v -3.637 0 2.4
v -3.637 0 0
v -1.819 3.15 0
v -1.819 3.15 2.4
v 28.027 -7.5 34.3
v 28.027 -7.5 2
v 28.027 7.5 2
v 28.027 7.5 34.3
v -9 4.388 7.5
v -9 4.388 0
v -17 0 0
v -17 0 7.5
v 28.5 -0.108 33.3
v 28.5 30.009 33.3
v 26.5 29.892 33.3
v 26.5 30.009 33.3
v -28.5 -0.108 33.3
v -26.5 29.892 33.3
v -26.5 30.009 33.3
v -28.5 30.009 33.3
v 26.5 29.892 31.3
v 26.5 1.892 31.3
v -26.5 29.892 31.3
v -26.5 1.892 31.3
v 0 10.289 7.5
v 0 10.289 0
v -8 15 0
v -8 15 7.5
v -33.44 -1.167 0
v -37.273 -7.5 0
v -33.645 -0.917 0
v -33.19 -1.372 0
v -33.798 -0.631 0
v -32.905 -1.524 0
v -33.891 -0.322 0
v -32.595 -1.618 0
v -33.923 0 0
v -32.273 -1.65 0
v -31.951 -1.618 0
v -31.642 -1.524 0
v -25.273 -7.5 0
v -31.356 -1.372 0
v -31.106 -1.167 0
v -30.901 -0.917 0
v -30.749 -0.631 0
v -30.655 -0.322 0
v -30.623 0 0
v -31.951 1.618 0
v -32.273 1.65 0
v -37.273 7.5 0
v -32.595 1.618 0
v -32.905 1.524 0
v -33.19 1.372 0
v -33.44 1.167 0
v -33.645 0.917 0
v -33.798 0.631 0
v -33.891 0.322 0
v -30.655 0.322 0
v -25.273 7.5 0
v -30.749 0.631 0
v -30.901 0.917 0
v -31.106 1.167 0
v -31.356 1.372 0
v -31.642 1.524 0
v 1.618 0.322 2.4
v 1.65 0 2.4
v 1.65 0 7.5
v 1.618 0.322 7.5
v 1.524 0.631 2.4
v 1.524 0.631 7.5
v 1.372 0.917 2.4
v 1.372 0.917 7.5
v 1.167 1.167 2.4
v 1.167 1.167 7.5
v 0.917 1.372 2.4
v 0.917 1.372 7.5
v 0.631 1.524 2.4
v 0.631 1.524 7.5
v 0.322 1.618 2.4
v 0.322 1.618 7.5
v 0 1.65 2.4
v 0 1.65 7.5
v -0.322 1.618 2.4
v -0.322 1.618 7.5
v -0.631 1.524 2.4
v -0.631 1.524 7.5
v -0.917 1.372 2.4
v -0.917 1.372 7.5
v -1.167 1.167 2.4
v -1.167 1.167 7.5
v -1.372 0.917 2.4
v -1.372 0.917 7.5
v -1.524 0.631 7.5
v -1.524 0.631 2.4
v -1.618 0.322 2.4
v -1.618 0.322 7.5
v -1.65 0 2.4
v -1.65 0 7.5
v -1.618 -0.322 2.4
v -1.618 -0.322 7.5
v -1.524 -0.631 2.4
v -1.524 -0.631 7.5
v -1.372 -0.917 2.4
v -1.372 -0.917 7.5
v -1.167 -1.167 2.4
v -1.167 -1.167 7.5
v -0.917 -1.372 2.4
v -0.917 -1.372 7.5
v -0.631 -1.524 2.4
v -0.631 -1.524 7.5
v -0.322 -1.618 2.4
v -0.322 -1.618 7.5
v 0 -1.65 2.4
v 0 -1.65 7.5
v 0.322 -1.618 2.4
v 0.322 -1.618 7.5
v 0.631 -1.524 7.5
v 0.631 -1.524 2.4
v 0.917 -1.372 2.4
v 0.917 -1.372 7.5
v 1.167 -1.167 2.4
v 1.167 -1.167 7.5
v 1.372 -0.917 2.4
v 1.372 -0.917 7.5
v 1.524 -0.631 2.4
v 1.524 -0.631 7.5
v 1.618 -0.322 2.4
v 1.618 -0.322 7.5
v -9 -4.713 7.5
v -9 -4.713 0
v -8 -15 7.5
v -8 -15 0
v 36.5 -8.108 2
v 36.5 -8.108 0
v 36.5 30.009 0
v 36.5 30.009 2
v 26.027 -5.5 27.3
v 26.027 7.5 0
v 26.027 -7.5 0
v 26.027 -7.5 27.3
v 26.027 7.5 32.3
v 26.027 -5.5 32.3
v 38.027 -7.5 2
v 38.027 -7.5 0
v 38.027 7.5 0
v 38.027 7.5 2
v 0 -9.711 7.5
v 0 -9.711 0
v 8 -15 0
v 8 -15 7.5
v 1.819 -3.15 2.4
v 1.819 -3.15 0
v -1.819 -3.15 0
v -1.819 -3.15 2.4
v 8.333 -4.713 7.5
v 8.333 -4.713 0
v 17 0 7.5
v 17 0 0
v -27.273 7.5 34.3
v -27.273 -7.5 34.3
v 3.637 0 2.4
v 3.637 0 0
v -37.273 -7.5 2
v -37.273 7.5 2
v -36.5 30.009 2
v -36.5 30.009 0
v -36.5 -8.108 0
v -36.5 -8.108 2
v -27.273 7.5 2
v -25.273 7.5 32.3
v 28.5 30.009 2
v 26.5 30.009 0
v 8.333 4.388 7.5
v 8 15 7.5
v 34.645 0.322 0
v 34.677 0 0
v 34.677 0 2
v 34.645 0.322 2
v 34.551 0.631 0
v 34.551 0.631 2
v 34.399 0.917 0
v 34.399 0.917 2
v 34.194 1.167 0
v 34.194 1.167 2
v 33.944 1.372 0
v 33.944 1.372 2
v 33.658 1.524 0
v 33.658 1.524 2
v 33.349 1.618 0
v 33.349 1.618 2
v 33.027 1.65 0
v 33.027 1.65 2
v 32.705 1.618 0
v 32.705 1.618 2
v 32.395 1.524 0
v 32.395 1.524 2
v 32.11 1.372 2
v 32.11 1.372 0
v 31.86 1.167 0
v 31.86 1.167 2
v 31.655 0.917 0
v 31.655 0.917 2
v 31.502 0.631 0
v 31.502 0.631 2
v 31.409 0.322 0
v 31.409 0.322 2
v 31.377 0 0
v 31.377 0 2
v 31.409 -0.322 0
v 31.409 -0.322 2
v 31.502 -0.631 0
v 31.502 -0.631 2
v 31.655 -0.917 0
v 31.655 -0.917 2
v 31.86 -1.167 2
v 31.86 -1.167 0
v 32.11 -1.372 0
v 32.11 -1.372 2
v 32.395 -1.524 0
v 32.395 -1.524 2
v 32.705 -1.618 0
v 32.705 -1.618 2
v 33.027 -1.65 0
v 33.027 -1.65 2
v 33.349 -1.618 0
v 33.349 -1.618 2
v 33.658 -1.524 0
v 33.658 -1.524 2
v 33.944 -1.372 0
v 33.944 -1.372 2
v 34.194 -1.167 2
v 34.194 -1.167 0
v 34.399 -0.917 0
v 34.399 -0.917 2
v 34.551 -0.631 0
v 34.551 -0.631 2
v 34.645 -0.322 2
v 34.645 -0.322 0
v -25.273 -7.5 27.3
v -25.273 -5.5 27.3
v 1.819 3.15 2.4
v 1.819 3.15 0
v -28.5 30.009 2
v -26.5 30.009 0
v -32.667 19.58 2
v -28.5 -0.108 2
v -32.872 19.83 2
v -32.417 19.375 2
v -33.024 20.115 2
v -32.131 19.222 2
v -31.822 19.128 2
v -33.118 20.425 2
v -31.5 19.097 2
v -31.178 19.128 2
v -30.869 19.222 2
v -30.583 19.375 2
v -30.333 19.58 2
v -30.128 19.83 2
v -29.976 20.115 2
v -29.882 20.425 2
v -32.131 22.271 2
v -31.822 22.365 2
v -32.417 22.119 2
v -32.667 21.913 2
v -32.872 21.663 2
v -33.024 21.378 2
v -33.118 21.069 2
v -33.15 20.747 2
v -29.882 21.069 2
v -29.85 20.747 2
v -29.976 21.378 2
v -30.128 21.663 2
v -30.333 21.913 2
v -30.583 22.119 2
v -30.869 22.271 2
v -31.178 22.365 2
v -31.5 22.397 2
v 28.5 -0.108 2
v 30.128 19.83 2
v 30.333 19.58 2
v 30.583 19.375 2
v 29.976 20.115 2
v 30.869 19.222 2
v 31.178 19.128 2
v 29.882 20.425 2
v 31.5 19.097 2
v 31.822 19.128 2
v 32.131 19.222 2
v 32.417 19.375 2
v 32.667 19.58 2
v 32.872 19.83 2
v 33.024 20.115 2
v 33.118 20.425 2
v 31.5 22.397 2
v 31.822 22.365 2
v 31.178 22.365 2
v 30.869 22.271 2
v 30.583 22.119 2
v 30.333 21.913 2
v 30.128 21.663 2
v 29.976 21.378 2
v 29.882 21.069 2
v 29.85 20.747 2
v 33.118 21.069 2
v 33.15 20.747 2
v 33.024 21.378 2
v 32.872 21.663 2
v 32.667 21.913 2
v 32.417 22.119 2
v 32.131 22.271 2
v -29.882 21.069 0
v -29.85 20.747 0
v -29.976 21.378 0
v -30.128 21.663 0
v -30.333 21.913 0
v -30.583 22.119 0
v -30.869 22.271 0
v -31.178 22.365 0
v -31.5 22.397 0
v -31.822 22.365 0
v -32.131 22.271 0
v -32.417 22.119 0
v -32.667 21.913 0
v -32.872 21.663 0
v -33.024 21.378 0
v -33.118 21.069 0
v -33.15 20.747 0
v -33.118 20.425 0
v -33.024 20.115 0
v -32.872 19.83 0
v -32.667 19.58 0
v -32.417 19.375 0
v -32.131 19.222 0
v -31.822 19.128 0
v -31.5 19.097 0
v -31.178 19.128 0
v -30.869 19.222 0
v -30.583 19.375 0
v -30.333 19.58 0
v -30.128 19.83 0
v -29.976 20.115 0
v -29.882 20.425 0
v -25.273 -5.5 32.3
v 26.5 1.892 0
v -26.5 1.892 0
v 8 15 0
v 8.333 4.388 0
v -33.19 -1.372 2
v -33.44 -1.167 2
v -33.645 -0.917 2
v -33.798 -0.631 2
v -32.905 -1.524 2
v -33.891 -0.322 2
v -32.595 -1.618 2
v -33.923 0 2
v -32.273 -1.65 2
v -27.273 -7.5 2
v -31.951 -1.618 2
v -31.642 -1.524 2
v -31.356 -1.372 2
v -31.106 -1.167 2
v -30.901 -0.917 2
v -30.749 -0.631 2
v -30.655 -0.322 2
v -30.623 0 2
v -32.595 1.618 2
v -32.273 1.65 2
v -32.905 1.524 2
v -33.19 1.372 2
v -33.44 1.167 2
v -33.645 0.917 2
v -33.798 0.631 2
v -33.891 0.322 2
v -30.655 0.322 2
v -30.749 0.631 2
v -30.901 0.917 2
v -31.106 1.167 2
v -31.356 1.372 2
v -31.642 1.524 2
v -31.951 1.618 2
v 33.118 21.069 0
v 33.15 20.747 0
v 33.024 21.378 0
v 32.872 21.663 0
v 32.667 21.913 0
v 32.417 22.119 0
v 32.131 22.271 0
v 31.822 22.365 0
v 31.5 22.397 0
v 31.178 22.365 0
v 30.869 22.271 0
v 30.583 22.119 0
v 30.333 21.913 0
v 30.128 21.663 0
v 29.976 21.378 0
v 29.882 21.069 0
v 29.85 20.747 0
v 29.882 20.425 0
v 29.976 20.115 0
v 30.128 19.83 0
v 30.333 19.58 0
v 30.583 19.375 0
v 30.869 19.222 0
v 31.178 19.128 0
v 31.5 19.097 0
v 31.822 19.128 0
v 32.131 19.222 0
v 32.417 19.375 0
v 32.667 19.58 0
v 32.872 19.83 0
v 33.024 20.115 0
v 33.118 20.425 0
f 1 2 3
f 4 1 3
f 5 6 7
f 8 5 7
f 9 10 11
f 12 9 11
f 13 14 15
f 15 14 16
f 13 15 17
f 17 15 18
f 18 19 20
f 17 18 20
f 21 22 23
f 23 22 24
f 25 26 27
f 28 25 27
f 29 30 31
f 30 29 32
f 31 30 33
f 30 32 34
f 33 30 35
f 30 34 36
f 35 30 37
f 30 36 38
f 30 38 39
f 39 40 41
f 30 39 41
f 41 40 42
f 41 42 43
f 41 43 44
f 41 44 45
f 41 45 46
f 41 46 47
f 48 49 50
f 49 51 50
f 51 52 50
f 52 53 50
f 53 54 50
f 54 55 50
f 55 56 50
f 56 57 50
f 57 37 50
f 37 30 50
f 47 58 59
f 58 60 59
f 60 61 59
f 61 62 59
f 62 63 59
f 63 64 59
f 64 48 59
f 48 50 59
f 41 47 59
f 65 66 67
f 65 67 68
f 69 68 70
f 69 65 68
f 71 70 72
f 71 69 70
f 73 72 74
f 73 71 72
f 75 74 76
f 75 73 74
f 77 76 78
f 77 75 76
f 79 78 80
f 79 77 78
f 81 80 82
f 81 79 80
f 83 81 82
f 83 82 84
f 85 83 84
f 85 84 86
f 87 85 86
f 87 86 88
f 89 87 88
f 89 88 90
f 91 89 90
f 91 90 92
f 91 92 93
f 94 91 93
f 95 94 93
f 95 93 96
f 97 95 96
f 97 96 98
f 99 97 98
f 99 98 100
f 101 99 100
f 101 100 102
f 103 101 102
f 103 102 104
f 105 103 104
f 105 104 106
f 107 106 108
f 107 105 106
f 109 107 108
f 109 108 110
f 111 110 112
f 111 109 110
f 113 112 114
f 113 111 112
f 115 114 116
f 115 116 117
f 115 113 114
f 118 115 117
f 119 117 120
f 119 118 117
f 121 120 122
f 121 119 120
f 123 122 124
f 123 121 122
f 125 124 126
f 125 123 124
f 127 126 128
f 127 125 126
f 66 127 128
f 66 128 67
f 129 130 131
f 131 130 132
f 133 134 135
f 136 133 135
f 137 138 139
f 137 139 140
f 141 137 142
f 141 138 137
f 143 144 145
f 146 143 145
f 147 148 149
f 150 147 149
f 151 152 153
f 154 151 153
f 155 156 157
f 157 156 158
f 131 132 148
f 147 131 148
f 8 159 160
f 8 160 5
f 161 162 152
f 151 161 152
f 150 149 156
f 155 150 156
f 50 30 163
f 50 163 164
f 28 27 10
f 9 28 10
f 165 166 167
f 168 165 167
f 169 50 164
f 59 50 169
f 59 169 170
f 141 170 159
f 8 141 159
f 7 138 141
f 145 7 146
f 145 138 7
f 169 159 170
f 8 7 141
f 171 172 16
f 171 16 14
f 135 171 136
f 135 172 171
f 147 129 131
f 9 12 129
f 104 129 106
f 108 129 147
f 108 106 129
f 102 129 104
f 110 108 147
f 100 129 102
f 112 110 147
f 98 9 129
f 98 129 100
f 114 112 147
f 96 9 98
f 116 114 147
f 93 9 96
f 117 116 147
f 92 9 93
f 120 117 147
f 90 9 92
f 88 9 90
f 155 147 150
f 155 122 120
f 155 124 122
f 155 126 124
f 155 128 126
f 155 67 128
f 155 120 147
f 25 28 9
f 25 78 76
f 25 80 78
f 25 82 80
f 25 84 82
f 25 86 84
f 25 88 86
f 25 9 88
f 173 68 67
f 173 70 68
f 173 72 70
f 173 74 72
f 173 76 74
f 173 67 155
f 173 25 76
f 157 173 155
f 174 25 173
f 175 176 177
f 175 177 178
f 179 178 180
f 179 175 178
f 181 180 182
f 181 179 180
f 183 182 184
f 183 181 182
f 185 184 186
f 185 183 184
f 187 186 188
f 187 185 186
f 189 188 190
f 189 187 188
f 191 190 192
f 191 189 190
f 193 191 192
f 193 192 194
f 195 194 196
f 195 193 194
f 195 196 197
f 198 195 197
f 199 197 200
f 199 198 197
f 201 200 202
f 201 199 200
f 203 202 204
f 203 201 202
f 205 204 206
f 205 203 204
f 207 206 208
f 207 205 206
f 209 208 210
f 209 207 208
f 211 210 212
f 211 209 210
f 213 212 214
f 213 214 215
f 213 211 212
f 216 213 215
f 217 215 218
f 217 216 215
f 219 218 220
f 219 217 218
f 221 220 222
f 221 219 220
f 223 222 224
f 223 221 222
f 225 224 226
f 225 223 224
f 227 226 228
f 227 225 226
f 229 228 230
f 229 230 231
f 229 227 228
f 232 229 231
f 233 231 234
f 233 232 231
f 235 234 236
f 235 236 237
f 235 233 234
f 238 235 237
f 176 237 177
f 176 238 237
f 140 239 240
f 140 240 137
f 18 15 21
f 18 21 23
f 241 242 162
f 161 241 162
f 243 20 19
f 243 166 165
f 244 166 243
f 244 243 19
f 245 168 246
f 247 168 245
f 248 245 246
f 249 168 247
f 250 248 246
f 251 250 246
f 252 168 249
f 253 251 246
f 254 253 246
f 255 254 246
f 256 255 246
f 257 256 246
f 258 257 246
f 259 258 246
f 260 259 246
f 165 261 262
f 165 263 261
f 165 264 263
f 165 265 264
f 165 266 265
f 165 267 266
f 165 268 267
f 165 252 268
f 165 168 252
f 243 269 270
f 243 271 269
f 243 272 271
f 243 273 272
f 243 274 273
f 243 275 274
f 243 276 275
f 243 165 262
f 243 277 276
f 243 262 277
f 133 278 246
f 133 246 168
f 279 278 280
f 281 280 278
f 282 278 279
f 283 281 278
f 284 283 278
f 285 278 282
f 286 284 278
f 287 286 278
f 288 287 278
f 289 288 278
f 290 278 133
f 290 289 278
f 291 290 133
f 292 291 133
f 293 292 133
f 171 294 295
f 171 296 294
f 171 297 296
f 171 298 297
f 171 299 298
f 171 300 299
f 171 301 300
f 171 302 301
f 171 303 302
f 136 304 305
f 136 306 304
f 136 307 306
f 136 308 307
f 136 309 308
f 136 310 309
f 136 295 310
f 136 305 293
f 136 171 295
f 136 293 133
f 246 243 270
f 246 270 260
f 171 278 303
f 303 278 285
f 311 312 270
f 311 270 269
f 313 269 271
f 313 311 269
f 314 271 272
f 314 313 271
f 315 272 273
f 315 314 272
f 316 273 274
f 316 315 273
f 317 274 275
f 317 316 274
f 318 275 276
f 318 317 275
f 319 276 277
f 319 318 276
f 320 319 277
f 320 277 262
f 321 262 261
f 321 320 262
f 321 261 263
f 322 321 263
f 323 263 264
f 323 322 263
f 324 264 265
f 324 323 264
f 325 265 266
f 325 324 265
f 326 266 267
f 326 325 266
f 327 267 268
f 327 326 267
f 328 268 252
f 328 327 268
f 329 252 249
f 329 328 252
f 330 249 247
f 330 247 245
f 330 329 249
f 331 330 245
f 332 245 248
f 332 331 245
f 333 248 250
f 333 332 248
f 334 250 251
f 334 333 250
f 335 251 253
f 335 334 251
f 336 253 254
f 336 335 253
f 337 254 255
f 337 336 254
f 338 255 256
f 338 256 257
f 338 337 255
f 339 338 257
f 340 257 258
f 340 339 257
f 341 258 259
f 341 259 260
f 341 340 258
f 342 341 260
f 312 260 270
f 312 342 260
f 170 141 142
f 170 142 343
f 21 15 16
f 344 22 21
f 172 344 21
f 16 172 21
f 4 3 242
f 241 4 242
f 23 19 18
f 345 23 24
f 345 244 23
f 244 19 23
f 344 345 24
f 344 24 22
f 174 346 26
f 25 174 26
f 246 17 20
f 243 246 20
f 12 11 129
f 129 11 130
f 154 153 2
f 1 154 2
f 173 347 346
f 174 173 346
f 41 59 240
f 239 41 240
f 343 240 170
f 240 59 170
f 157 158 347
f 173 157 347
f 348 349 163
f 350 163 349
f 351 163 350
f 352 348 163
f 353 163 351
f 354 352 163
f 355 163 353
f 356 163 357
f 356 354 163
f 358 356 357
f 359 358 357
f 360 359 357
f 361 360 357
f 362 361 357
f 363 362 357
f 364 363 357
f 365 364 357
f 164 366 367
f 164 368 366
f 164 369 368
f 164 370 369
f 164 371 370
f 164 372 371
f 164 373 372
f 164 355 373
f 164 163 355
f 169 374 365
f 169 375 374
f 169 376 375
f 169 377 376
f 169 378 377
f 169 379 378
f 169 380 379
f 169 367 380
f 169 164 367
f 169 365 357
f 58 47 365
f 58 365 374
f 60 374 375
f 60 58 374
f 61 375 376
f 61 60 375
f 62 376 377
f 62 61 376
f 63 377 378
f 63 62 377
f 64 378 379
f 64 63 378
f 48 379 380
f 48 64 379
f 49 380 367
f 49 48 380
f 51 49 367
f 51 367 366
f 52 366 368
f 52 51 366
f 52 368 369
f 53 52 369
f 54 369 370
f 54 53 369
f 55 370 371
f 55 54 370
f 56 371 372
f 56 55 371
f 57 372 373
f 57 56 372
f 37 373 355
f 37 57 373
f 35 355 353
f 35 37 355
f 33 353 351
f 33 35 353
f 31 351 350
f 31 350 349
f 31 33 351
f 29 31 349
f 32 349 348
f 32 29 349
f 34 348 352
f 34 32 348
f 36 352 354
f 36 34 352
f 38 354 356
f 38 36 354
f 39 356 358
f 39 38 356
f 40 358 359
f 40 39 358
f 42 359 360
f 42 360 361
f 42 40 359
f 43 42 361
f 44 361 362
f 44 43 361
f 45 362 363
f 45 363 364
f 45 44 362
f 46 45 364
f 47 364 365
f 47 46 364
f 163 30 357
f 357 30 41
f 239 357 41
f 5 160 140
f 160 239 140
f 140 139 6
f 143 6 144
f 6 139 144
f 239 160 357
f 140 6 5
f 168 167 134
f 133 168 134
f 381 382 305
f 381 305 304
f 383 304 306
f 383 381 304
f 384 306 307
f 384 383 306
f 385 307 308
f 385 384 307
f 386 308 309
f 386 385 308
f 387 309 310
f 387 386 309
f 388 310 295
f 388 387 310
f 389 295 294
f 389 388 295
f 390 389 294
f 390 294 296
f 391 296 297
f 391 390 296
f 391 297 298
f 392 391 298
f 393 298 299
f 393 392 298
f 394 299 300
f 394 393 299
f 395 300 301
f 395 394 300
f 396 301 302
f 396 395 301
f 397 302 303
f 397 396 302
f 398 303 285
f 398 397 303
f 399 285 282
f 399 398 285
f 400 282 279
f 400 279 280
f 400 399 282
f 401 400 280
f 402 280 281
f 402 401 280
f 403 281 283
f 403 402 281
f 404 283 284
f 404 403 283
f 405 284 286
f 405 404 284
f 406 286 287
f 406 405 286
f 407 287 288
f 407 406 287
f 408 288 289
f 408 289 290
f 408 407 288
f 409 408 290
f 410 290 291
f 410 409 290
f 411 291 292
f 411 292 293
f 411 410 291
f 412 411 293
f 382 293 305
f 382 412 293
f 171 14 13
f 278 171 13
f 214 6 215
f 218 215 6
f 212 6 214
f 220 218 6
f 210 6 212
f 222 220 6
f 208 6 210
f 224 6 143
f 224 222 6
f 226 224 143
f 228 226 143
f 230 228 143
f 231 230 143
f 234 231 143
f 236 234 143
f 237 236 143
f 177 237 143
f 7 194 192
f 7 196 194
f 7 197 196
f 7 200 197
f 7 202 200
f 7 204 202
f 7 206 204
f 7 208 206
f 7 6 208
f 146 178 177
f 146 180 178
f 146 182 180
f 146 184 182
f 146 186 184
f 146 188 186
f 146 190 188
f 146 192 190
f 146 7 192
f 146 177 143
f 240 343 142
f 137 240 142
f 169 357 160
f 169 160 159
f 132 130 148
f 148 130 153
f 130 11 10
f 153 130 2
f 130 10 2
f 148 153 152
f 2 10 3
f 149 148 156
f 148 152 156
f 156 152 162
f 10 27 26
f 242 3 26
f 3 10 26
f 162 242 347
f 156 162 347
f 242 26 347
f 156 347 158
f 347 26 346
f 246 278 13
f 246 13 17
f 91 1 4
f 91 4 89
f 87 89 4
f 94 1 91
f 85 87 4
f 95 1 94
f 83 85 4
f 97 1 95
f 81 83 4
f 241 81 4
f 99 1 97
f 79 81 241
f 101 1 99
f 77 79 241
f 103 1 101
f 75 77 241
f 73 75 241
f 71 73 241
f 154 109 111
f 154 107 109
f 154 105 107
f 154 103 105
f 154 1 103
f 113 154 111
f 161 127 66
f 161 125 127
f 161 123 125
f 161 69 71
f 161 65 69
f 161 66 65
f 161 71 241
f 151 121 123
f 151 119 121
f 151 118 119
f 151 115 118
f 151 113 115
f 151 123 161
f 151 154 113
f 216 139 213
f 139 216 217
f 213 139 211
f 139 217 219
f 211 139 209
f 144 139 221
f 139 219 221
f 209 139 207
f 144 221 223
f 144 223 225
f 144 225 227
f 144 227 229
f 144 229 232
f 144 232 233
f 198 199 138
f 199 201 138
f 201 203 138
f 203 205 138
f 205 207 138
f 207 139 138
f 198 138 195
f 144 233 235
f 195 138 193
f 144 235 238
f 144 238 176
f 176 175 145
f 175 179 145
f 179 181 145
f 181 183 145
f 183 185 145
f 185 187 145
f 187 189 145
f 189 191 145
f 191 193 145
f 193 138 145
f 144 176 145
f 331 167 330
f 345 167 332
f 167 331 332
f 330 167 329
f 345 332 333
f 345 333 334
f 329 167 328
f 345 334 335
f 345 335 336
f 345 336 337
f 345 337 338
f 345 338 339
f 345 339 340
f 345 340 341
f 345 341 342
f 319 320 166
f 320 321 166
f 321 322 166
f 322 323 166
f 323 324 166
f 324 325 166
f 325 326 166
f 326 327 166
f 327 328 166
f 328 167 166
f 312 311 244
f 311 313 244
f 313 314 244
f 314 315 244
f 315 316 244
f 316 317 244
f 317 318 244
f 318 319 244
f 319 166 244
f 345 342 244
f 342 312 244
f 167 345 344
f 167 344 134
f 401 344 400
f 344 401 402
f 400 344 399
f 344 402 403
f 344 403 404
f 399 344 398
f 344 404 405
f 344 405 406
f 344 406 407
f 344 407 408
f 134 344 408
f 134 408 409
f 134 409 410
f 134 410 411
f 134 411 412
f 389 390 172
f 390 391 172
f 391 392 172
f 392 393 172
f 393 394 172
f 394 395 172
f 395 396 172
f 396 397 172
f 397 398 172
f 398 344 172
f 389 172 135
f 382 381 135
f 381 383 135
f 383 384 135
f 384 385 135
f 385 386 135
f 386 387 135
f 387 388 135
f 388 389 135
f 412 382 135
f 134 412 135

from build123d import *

# Parameters (mm, degrees)
SKETCH_R        = 1.65
PAD_DEPTH       = 7.5
POCKET_DEPTH    = 2.4
SKETCH002_R     = 1.65
PAD001_DEPTH    = 2
PAD002_DEPTH    = 31.3
SKETCH005_W     = 53
SKETCH005_H     = 2
PAD003_DEPTH    = 28
SKETCH006_W     = 75.3
SKETCH006_H     = 15
SKETCH006_R     = 1.65
PAD004_DEPTH    = 2
SKETCH007_W     = 55.3
SKETCH007_H     = 15
PAD005_DEPTH    = 32.3
SKETCH008_W     = 51.3
SKETCH008_H     = 32.3
POCKET001_DEPTH = 15.001
SKETCH009_W     = 51.3
SKETCH009_H     = 2
PAD006_DEPTH    = 5


with BuildPart() as pezinhos:
    # Sketch → Pad (new body)
    with BuildSketch(Plane.XY):
        Polygon((8, -15), (8.333333, -4.712968), (17, 0), (8.333333, 4.387791), (8, 15), (0, 10.289429), (-8, 15), (-9, 4.387791), (-17, -5.5e-05), (-9, -4.712968), (-8, -15), (0, -9.710571), align=None)
        Circle(SKETCH_R, mode=Mode.SUBTRACT)
    extrude(amount=PAD_DEPTH)

    # Sketch001 (on Face14 of Pad) → Pocket (cut)
    with BuildSketch(Plane(origin=(0, 0, 0), x_dir=(1, 0, 0), z_dir=(0, 0, -1))):
        Polygon((1.818653, -3.15), (3.637307, 0), (1.818653, 3.15), (-1.818653, 3.15), (-3.637307, 0), (-1.818653, -3.15), align=None)
    extrude(amount=-POCKET_DEPTH, mode=Mode.SUBTRACT)


with BuildPart() as ps_sul:
    # Sketch002 → Pad001 (new body)
    with BuildSketch(Plane.XY):
        Polygon((-26.5, 1.892332), (-26.5, 30.009431), (-36.5, 30.009431), (-36.5, 10.009431), (-36.5, -8.107668), (36.5, -8.107668), (36.5, 0), (36.5, 30.009431), (26.5, 30.009431), (26.5, 1.892332), align=None)
        with Locations((-31.5, 20.746655)):
            Circle(SKETCH002_R, mode=Mode.SUBTRACT)
        with Locations((31.5, 20.746655)):
            Circle(SKETCH002_R, mode=Mode.SUBTRACT)
    extrude(amount=PAD001_DEPTH)

    # Sketch004 (on Face14 of Pad001) → Pad002 (join)
    with BuildSketch(Plane.XY.offset(2)):
        Polygon((-26.5, 30.009431), (-26.5, 1.892332), (26.5, 1.892332), (26.5, 30.009431), (28.5, 30.009431), (28.5, -0.107668), (-28.5, -0.107668), (-28.5, 30.009431), align=None)
    extrude(amount=PAD002_DEPTH)

    # Sketch005 (on Face7 of Pad002) → Pad003 (join)
    with BuildSketch(Plane(origin=(0, 1.892332, 0), x_dir=(-1, 0, 0), z_dir=(0, 1, 0))):
        with Locations((0, 32.3)):
            Rectangle(SKETCH005_W, SKETCH005_H)
    extrude(amount=PAD003_DEPTH)


with BuildPart() as ps_norte:
    # Sketch006 → Pad004 (new body)
    with BuildSketch(Plane.XY):
        with Locations((0.376887, 0)):
            Rectangle(SKETCH006_W, SKETCH006_H)
        with Locations((33.026887, 0)):
            Circle(SKETCH006_R, mode=Mode.SUBTRACT)
        with Locations((-32.273113, 0)):
            Circle(SKETCH006_R, mode=Mode.SUBTRACT)
    extrude(amount=PAD004_DEPTH)

    # Sketch007 (on Face8 of Pad004) → Pad005 (join)
    with BuildSketch(Plane.XY.offset(2)):
        with Locations((0.376887, 0)):
            Rectangle(SKETCH007_W, SKETCH007_H)
    extrude(amount=PAD005_DEPTH)

    # Sketch008 (on Face6 of Pad005) → Pocket001 (cut, through all)
    with BuildSketch(Plane(origin=(0, 7.5, 0), x_dir=(-1, 0, 0), z_dir=(0, 1, 0))):
        with Locations((-0.376887, 16.15)):
            Rectangle(SKETCH008_W, SKETCH008_H)
    extrude(amount=-POCKET001_DEPTH, mode=Mode.SUBTRACT)

    # Sketch009 (on Face10 of Pocket001) → Pad006 (join)
    with BuildSketch(Plane(origin=(0, 0, 32.3), x_dir=(1, 0, 0), z_dir=(0, 0, -1))):
        with Locations((0.376887, 6.5)):
            Rectangle(SKETCH009_W, SKETCH009_H)
    extrude(amount=PAD006_DEPTH)


solid = Compound([pezinhos.part, ps_sul.part, ps_norte.part])
